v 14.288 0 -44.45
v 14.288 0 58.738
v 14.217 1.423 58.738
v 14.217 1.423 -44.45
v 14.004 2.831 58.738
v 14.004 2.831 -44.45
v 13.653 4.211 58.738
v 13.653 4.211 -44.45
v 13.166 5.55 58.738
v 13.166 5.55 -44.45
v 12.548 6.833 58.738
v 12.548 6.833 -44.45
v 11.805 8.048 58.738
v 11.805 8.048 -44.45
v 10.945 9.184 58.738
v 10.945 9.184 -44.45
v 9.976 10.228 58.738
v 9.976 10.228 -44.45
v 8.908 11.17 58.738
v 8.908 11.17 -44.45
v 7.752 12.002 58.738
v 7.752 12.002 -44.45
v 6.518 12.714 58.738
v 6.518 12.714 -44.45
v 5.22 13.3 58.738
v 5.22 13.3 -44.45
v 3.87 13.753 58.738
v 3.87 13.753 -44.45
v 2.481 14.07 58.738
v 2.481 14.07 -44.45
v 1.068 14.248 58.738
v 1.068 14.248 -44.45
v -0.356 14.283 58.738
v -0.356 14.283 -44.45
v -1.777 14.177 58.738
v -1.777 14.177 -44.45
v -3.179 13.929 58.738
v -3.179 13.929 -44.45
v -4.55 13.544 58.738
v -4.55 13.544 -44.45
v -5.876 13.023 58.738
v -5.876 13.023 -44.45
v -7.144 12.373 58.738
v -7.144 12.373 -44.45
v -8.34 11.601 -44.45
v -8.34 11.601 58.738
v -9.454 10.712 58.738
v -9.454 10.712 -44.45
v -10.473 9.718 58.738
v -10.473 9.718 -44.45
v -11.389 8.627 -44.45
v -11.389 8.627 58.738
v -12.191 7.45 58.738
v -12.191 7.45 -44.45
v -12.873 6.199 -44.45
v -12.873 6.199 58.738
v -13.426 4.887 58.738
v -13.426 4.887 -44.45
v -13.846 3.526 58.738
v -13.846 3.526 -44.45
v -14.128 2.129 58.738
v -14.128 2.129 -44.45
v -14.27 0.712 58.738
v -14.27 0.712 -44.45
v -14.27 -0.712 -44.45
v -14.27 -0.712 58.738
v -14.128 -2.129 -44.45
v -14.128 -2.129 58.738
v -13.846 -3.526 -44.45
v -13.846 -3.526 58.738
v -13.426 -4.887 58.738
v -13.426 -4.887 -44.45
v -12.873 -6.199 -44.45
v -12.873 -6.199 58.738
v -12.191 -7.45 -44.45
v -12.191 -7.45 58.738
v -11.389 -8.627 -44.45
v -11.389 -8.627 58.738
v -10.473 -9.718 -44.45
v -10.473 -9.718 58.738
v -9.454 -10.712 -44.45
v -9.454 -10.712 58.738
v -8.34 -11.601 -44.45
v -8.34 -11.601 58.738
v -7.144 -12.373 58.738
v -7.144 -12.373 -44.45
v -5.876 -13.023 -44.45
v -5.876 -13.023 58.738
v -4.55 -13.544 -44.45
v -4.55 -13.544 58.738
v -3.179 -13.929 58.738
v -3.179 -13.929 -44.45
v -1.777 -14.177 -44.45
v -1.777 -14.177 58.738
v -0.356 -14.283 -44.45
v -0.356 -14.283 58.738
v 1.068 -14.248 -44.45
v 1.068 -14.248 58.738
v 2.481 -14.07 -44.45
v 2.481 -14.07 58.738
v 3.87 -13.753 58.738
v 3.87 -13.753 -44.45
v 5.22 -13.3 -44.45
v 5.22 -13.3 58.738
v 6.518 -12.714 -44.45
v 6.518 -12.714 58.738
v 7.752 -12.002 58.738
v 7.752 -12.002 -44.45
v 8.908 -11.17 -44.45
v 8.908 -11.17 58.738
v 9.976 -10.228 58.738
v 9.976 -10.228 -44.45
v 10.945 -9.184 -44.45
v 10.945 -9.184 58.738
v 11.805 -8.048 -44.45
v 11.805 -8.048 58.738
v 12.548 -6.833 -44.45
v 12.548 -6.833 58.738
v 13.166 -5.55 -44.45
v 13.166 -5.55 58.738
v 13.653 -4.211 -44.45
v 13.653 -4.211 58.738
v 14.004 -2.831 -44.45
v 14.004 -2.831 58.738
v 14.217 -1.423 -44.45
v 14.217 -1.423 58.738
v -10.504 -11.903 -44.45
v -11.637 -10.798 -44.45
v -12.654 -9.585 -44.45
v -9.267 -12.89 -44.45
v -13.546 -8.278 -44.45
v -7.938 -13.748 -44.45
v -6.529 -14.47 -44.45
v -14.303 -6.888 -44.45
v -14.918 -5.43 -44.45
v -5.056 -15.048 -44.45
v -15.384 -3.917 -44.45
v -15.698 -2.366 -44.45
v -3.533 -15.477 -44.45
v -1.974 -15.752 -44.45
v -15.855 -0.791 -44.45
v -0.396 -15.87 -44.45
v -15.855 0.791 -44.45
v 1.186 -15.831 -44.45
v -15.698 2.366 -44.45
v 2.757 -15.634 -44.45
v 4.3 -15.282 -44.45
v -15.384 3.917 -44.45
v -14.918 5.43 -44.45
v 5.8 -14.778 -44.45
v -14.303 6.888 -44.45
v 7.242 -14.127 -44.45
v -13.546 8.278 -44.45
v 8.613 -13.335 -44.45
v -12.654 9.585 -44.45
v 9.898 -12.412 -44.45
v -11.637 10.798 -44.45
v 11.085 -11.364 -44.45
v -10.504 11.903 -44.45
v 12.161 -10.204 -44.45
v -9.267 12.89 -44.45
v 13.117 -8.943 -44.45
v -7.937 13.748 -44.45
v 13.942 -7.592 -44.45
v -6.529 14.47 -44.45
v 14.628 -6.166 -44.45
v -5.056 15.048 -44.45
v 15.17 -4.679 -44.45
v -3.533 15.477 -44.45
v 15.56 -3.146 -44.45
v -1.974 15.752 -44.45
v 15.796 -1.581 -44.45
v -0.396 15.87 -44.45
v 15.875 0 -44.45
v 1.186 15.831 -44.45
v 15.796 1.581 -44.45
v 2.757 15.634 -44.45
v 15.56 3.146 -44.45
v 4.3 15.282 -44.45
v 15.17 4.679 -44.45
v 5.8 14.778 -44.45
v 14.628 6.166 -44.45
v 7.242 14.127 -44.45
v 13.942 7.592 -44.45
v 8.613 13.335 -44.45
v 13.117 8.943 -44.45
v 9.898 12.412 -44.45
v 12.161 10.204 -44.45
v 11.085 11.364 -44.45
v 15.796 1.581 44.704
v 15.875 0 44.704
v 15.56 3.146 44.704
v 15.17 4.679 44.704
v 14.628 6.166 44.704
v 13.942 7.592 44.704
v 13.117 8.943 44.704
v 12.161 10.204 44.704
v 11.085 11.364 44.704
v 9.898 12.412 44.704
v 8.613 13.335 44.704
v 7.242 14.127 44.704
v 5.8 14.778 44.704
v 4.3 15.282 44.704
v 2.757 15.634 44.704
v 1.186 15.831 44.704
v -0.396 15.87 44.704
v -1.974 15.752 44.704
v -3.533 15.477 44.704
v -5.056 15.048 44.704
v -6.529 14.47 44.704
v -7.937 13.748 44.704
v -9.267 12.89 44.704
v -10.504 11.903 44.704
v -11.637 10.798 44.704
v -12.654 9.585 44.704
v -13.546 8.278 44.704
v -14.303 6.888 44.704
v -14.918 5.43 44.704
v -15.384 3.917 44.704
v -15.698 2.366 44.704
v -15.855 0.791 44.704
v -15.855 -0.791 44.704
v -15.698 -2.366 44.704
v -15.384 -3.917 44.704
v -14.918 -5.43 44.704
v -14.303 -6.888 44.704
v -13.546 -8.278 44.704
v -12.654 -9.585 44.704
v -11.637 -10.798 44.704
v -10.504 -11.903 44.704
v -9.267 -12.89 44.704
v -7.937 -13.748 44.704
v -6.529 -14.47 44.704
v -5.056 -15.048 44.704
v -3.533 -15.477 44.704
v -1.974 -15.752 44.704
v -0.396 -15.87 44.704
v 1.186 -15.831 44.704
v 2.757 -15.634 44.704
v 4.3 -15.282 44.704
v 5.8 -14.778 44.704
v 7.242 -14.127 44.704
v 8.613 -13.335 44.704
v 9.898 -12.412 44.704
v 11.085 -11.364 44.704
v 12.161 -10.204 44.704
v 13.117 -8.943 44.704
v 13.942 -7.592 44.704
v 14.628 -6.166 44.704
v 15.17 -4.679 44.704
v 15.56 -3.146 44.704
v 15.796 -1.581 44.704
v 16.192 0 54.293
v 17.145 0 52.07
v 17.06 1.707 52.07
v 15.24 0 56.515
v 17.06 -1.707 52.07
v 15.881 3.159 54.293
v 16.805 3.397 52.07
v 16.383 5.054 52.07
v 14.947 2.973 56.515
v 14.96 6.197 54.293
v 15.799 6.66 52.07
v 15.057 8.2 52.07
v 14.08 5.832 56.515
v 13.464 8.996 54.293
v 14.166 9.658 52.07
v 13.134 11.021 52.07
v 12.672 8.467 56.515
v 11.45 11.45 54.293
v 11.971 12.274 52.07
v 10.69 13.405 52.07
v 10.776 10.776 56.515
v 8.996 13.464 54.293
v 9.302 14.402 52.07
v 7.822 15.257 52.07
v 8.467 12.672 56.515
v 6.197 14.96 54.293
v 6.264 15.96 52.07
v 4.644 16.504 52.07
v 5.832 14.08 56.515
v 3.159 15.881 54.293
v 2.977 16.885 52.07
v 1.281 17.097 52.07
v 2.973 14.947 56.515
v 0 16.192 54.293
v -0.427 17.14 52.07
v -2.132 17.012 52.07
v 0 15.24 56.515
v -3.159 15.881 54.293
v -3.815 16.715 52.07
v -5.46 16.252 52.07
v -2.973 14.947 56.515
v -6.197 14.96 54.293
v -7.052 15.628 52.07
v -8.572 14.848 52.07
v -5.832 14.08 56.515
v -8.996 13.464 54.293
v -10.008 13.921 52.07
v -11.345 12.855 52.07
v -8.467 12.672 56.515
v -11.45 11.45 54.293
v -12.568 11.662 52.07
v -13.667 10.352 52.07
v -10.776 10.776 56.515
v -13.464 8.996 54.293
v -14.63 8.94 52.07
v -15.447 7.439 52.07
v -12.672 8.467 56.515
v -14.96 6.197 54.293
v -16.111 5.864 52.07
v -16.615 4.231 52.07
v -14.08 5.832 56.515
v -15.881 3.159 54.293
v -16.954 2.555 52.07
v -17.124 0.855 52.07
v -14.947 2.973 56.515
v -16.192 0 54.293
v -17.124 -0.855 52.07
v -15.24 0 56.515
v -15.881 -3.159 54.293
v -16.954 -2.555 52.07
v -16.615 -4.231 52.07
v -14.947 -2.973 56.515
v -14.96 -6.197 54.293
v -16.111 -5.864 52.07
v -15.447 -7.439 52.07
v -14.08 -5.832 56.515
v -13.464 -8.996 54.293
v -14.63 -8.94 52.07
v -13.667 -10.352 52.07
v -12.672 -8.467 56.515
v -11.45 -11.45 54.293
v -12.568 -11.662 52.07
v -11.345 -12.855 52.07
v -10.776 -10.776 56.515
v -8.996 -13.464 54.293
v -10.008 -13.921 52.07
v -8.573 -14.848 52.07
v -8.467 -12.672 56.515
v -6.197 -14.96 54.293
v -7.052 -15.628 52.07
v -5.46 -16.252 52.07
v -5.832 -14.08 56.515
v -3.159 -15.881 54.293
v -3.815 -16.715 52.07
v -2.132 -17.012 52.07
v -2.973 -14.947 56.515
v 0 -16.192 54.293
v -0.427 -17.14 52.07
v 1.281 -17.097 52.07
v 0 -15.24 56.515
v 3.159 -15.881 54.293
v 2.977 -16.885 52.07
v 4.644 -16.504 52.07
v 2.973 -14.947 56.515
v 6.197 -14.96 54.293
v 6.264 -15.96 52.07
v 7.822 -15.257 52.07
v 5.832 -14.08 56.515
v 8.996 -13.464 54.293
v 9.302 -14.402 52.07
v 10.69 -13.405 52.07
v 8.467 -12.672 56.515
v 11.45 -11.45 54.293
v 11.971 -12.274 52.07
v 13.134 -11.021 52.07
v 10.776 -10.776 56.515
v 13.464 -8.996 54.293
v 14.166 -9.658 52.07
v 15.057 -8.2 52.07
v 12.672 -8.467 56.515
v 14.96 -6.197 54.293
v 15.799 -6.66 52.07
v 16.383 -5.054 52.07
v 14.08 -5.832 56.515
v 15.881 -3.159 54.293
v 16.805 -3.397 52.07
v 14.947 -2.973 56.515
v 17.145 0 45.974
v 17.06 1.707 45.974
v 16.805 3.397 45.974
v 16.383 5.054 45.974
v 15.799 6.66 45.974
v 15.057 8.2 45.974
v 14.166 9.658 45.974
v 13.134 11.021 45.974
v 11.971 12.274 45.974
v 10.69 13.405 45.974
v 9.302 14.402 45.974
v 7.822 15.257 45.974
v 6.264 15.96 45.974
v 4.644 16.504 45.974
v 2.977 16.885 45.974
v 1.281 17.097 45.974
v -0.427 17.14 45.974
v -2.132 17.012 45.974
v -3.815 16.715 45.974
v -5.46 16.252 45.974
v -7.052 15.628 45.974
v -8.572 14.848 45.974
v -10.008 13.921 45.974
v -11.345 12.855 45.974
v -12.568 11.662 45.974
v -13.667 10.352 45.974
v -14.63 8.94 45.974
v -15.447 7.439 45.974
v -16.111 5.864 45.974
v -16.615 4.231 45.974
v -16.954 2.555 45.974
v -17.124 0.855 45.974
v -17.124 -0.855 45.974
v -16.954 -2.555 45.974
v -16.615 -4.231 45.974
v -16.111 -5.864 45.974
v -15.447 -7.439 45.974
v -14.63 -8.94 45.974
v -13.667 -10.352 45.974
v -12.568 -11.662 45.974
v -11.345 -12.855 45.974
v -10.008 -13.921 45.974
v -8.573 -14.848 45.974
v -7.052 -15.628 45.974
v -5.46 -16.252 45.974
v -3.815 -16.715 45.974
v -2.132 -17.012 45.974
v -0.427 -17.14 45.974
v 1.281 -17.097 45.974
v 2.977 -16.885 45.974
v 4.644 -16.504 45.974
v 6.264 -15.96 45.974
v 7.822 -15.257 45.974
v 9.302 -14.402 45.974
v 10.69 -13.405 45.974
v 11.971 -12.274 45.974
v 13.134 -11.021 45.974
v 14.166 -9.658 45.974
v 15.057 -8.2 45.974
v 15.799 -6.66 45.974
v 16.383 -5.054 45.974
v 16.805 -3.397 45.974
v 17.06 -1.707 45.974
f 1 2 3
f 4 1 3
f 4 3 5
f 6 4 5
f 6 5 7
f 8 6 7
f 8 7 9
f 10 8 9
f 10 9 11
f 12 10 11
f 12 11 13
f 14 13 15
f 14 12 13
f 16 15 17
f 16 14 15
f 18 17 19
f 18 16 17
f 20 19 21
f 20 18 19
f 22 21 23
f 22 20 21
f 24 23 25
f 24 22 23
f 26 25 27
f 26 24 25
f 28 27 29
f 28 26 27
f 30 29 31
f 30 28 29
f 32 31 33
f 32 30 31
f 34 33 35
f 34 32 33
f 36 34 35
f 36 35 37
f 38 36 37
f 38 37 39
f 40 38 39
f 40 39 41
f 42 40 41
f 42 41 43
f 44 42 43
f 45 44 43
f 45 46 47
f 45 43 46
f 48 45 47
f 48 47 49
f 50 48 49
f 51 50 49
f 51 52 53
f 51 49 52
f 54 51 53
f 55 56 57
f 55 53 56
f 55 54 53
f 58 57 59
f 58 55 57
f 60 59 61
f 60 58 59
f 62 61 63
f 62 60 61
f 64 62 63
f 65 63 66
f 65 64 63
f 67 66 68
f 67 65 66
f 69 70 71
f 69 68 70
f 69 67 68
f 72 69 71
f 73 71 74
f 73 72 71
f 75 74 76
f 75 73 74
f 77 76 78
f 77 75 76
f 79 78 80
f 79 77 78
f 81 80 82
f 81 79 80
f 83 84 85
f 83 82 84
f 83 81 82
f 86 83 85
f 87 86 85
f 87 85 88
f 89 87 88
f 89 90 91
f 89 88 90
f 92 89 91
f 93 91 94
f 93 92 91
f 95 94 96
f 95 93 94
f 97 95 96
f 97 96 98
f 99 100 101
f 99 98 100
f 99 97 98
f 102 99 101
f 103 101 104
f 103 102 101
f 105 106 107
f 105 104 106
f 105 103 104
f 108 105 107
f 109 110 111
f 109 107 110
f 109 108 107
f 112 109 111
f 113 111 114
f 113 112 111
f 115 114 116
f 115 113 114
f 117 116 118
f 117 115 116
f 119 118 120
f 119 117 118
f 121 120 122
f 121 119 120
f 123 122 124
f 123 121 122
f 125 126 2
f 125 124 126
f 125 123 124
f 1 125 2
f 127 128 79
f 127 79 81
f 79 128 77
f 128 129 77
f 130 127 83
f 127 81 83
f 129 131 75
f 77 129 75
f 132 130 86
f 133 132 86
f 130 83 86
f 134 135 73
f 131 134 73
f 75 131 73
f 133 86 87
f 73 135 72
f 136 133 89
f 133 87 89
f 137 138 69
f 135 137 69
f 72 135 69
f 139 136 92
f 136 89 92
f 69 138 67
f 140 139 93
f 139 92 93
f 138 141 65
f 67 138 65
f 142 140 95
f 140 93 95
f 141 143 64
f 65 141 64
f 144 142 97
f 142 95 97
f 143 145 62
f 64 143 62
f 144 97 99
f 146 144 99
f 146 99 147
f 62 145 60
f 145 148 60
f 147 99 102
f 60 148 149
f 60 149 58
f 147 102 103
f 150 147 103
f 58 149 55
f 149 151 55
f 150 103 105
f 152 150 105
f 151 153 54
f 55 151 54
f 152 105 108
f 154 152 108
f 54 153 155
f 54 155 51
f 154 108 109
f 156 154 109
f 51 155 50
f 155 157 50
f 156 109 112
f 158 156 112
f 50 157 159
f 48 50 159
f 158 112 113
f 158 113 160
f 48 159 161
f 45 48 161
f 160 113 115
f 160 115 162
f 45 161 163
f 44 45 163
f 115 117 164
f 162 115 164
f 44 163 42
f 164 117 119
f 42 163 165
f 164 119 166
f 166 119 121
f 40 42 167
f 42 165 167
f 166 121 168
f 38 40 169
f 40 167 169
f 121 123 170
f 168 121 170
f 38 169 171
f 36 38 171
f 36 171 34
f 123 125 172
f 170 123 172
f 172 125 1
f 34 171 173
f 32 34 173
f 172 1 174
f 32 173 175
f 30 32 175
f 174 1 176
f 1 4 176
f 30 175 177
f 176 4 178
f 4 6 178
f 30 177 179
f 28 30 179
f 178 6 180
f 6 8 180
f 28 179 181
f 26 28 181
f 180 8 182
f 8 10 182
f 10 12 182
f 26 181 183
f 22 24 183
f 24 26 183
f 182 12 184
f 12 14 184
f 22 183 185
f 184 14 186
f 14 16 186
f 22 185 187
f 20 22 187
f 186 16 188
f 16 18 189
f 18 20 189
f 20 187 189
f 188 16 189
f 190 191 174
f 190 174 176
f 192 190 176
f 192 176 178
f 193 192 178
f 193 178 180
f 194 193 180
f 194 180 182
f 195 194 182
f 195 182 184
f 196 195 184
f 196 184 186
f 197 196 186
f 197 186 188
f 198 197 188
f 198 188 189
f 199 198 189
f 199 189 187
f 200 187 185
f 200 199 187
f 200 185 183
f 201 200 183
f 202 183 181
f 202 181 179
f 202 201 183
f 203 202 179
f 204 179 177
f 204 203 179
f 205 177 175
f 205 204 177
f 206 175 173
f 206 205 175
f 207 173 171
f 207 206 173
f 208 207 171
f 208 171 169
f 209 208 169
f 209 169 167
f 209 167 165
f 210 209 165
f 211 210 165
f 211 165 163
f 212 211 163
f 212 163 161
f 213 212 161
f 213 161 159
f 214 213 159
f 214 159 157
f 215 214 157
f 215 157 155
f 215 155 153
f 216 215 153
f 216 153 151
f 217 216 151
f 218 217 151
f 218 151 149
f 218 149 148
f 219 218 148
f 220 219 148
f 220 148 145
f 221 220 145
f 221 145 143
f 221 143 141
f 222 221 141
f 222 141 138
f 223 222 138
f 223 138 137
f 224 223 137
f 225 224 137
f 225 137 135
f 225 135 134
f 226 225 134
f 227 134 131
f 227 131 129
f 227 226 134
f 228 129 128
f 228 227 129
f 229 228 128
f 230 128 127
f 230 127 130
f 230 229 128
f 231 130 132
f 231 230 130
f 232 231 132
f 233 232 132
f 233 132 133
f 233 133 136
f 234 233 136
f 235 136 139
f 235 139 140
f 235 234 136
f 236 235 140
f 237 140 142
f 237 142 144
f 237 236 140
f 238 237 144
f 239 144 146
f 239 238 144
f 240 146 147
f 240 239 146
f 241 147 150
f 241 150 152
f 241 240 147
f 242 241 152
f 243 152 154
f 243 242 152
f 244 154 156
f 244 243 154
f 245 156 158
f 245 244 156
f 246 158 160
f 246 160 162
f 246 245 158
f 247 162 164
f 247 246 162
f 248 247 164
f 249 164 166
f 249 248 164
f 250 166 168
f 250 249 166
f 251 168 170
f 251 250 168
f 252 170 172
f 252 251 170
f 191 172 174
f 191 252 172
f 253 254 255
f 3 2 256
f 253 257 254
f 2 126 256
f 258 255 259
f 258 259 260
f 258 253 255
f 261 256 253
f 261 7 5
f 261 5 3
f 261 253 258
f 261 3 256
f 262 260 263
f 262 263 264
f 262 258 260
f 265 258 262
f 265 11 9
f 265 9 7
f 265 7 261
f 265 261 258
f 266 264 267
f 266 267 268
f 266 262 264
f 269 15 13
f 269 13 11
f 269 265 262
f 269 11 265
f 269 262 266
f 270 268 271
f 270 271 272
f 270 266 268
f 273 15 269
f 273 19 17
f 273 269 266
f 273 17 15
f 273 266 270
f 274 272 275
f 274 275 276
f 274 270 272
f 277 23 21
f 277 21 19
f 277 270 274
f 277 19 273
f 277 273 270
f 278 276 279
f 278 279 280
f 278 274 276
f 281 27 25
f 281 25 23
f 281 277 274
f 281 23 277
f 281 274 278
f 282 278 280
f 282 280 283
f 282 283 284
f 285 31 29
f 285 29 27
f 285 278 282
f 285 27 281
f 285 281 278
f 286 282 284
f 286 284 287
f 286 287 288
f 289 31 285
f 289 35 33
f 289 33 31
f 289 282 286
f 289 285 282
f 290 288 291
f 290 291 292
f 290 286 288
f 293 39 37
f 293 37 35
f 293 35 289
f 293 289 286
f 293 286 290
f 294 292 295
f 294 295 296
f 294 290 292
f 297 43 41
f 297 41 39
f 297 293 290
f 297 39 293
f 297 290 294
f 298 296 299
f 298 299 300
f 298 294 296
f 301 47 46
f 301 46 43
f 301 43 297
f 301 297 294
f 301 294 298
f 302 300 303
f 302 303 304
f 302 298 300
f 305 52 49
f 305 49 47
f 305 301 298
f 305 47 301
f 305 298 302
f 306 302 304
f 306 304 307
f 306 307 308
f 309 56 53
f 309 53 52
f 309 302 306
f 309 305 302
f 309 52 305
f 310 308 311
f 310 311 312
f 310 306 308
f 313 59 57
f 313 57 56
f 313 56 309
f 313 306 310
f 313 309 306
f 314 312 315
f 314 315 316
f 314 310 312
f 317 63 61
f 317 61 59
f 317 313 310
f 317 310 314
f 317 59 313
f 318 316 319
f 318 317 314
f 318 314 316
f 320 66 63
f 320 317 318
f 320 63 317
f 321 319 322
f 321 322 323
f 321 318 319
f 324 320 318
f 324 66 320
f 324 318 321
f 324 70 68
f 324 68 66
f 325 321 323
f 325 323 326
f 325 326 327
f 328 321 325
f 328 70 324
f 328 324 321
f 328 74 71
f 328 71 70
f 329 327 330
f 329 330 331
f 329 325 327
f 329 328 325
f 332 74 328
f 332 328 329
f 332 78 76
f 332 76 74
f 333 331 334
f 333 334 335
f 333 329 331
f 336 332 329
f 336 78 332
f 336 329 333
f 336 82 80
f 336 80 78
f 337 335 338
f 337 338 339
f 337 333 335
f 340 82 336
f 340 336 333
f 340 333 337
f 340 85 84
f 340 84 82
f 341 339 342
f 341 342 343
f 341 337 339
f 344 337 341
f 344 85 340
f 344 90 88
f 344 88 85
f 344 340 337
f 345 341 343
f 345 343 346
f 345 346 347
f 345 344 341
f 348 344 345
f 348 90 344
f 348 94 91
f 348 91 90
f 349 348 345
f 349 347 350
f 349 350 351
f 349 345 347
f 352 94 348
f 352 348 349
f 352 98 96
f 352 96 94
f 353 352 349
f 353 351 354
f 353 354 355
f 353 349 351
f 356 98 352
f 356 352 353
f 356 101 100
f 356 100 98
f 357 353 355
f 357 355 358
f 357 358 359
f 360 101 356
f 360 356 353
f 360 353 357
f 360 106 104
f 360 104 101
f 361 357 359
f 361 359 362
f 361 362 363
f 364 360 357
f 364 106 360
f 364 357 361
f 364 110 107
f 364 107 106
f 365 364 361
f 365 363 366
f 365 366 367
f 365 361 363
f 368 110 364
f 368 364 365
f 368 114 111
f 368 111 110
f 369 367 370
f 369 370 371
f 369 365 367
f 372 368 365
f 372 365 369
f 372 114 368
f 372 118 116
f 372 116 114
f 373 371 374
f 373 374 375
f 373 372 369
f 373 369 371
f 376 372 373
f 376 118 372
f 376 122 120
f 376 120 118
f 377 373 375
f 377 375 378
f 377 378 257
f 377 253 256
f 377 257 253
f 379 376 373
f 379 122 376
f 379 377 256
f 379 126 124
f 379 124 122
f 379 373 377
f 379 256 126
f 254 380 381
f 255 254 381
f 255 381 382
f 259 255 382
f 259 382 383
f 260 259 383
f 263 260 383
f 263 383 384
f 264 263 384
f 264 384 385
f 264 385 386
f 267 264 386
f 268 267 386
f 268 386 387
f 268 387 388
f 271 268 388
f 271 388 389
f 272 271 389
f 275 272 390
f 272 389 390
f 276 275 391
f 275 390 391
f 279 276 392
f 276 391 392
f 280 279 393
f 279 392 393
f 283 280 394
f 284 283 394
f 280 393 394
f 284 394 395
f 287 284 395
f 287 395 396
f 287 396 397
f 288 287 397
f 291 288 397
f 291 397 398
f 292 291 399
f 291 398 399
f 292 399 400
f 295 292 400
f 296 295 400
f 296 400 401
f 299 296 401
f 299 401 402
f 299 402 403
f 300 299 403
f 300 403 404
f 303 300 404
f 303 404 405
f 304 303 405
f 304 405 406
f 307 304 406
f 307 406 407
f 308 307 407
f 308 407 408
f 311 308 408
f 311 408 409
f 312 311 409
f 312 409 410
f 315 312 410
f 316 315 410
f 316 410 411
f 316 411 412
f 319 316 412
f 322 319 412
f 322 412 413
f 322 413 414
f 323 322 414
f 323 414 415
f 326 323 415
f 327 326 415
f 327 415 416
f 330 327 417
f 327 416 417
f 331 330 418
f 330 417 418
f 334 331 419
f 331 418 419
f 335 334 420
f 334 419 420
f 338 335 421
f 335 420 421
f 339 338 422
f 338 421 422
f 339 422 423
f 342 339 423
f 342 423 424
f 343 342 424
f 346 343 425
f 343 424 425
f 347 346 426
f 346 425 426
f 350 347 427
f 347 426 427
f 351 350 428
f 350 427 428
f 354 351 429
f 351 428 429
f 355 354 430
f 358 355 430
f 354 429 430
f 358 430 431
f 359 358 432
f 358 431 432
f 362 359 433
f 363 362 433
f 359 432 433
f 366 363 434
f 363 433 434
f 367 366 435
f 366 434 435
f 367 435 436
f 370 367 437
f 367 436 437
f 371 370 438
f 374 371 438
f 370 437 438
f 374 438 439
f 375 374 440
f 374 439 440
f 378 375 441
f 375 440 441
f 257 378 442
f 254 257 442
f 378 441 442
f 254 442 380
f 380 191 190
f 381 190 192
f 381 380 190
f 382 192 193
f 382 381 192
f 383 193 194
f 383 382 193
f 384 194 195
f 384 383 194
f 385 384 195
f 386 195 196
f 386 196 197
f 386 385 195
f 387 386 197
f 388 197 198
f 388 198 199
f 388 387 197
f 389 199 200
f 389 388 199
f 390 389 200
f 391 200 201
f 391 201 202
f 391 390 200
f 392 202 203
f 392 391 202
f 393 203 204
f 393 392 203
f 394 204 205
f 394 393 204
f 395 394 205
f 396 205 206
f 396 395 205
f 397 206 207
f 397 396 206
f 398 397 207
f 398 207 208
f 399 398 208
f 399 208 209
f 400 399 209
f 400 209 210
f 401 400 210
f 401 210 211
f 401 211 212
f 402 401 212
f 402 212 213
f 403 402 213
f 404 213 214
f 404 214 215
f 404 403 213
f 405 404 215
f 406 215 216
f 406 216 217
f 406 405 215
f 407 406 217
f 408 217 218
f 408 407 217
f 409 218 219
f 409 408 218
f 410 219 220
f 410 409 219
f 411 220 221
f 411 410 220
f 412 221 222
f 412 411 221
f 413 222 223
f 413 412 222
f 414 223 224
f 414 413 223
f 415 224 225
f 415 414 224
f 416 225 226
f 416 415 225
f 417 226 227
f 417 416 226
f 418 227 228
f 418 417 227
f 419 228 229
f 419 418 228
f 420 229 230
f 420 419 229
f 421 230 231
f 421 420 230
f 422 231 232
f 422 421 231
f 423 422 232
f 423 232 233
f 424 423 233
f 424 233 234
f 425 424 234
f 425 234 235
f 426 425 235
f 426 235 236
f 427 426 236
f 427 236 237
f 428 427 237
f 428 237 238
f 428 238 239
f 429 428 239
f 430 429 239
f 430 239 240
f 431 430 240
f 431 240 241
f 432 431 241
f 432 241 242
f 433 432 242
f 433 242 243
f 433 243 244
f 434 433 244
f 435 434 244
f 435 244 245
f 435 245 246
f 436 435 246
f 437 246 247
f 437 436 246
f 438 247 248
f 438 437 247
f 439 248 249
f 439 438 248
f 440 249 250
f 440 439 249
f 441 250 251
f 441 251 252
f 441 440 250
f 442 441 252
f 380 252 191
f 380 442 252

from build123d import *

# Parameters (mm, degrees)
F0_R        = 15.875
F0_R_2      = 14.2875
F1_DEPTH    = 44.45
F2_R        = 17.145
F2_R_2      = 14.2875
F3_DEPTH    = 16.51
F5_S5_R     = 15.875
F5_T6_DEPTH = 26


# Not quite as in the source:
# - a fillet or chamfer that OpenCascade refuses, or shapes differently, is made with other operations: its cross-section is extruded or revolved along the edge and cut away or added


with BuildPart() as f1:
    # F0 (on Top) → F1 (new body, symmetric)
    with BuildSketch(Plane.XY):
        Circle(F0_R)
        Circle(F0_R_2, mode=Mode.SUBTRACT)
    extrude(amount=F1_DEPTH, both=True)

    # F2 (on face) → F3 (join)
    with BuildSketch(Plane.XY.offset(44.45)):
        Circle(F2_R)
        Circle(F2_R_2, mode=Mode.SUBTRACT)
    extrude(amount=F3_DEPTH)

    # F4: chamfer of 3.81 x 8.89 on 1 edges, made by hand

    # F4_s1 → F4_t2 (revolve, cut)
    with BuildSketch(Plane.XZ):
        Polygon((17.145, 52.07), (13.335, 60.96), (17.145, 60.96), align=None)
    revolve(axis=Axis((0, 0, 60.96), (0, 0, 1)), mode=Mode.SUBTRACT)

    # F5: chamfer of 1.524 on 1 edges, made by hand


with BuildPart() as f5_tool2:
    # F5_s3 → F5_t4 (revolve)
    with BuildSketch(Plane.XZ):
        Polygon((15.621, 44.45), (17.145, 45.974), (17.145, 44.45), align=None)
    revolve(axis=Axis((0, 0, 44.45), (0, 0, 1)))

    # F5_s5 → F5_t6 (cut, symmetric)
    with BuildSketch(Plane.XY.offset(45.2)):
        Circle(F5_S5_R)
    extrude(amount=F5_T6_DEPTH, both=True, mode=Mode.SUBTRACT)


with BuildPart() as f1_1:
    add(f1.part)

    # F5_t1: cut F5_tool2
    add(f5_tool2.part, mode=Mode.SUBTRACT)


solid = f1_1.part
